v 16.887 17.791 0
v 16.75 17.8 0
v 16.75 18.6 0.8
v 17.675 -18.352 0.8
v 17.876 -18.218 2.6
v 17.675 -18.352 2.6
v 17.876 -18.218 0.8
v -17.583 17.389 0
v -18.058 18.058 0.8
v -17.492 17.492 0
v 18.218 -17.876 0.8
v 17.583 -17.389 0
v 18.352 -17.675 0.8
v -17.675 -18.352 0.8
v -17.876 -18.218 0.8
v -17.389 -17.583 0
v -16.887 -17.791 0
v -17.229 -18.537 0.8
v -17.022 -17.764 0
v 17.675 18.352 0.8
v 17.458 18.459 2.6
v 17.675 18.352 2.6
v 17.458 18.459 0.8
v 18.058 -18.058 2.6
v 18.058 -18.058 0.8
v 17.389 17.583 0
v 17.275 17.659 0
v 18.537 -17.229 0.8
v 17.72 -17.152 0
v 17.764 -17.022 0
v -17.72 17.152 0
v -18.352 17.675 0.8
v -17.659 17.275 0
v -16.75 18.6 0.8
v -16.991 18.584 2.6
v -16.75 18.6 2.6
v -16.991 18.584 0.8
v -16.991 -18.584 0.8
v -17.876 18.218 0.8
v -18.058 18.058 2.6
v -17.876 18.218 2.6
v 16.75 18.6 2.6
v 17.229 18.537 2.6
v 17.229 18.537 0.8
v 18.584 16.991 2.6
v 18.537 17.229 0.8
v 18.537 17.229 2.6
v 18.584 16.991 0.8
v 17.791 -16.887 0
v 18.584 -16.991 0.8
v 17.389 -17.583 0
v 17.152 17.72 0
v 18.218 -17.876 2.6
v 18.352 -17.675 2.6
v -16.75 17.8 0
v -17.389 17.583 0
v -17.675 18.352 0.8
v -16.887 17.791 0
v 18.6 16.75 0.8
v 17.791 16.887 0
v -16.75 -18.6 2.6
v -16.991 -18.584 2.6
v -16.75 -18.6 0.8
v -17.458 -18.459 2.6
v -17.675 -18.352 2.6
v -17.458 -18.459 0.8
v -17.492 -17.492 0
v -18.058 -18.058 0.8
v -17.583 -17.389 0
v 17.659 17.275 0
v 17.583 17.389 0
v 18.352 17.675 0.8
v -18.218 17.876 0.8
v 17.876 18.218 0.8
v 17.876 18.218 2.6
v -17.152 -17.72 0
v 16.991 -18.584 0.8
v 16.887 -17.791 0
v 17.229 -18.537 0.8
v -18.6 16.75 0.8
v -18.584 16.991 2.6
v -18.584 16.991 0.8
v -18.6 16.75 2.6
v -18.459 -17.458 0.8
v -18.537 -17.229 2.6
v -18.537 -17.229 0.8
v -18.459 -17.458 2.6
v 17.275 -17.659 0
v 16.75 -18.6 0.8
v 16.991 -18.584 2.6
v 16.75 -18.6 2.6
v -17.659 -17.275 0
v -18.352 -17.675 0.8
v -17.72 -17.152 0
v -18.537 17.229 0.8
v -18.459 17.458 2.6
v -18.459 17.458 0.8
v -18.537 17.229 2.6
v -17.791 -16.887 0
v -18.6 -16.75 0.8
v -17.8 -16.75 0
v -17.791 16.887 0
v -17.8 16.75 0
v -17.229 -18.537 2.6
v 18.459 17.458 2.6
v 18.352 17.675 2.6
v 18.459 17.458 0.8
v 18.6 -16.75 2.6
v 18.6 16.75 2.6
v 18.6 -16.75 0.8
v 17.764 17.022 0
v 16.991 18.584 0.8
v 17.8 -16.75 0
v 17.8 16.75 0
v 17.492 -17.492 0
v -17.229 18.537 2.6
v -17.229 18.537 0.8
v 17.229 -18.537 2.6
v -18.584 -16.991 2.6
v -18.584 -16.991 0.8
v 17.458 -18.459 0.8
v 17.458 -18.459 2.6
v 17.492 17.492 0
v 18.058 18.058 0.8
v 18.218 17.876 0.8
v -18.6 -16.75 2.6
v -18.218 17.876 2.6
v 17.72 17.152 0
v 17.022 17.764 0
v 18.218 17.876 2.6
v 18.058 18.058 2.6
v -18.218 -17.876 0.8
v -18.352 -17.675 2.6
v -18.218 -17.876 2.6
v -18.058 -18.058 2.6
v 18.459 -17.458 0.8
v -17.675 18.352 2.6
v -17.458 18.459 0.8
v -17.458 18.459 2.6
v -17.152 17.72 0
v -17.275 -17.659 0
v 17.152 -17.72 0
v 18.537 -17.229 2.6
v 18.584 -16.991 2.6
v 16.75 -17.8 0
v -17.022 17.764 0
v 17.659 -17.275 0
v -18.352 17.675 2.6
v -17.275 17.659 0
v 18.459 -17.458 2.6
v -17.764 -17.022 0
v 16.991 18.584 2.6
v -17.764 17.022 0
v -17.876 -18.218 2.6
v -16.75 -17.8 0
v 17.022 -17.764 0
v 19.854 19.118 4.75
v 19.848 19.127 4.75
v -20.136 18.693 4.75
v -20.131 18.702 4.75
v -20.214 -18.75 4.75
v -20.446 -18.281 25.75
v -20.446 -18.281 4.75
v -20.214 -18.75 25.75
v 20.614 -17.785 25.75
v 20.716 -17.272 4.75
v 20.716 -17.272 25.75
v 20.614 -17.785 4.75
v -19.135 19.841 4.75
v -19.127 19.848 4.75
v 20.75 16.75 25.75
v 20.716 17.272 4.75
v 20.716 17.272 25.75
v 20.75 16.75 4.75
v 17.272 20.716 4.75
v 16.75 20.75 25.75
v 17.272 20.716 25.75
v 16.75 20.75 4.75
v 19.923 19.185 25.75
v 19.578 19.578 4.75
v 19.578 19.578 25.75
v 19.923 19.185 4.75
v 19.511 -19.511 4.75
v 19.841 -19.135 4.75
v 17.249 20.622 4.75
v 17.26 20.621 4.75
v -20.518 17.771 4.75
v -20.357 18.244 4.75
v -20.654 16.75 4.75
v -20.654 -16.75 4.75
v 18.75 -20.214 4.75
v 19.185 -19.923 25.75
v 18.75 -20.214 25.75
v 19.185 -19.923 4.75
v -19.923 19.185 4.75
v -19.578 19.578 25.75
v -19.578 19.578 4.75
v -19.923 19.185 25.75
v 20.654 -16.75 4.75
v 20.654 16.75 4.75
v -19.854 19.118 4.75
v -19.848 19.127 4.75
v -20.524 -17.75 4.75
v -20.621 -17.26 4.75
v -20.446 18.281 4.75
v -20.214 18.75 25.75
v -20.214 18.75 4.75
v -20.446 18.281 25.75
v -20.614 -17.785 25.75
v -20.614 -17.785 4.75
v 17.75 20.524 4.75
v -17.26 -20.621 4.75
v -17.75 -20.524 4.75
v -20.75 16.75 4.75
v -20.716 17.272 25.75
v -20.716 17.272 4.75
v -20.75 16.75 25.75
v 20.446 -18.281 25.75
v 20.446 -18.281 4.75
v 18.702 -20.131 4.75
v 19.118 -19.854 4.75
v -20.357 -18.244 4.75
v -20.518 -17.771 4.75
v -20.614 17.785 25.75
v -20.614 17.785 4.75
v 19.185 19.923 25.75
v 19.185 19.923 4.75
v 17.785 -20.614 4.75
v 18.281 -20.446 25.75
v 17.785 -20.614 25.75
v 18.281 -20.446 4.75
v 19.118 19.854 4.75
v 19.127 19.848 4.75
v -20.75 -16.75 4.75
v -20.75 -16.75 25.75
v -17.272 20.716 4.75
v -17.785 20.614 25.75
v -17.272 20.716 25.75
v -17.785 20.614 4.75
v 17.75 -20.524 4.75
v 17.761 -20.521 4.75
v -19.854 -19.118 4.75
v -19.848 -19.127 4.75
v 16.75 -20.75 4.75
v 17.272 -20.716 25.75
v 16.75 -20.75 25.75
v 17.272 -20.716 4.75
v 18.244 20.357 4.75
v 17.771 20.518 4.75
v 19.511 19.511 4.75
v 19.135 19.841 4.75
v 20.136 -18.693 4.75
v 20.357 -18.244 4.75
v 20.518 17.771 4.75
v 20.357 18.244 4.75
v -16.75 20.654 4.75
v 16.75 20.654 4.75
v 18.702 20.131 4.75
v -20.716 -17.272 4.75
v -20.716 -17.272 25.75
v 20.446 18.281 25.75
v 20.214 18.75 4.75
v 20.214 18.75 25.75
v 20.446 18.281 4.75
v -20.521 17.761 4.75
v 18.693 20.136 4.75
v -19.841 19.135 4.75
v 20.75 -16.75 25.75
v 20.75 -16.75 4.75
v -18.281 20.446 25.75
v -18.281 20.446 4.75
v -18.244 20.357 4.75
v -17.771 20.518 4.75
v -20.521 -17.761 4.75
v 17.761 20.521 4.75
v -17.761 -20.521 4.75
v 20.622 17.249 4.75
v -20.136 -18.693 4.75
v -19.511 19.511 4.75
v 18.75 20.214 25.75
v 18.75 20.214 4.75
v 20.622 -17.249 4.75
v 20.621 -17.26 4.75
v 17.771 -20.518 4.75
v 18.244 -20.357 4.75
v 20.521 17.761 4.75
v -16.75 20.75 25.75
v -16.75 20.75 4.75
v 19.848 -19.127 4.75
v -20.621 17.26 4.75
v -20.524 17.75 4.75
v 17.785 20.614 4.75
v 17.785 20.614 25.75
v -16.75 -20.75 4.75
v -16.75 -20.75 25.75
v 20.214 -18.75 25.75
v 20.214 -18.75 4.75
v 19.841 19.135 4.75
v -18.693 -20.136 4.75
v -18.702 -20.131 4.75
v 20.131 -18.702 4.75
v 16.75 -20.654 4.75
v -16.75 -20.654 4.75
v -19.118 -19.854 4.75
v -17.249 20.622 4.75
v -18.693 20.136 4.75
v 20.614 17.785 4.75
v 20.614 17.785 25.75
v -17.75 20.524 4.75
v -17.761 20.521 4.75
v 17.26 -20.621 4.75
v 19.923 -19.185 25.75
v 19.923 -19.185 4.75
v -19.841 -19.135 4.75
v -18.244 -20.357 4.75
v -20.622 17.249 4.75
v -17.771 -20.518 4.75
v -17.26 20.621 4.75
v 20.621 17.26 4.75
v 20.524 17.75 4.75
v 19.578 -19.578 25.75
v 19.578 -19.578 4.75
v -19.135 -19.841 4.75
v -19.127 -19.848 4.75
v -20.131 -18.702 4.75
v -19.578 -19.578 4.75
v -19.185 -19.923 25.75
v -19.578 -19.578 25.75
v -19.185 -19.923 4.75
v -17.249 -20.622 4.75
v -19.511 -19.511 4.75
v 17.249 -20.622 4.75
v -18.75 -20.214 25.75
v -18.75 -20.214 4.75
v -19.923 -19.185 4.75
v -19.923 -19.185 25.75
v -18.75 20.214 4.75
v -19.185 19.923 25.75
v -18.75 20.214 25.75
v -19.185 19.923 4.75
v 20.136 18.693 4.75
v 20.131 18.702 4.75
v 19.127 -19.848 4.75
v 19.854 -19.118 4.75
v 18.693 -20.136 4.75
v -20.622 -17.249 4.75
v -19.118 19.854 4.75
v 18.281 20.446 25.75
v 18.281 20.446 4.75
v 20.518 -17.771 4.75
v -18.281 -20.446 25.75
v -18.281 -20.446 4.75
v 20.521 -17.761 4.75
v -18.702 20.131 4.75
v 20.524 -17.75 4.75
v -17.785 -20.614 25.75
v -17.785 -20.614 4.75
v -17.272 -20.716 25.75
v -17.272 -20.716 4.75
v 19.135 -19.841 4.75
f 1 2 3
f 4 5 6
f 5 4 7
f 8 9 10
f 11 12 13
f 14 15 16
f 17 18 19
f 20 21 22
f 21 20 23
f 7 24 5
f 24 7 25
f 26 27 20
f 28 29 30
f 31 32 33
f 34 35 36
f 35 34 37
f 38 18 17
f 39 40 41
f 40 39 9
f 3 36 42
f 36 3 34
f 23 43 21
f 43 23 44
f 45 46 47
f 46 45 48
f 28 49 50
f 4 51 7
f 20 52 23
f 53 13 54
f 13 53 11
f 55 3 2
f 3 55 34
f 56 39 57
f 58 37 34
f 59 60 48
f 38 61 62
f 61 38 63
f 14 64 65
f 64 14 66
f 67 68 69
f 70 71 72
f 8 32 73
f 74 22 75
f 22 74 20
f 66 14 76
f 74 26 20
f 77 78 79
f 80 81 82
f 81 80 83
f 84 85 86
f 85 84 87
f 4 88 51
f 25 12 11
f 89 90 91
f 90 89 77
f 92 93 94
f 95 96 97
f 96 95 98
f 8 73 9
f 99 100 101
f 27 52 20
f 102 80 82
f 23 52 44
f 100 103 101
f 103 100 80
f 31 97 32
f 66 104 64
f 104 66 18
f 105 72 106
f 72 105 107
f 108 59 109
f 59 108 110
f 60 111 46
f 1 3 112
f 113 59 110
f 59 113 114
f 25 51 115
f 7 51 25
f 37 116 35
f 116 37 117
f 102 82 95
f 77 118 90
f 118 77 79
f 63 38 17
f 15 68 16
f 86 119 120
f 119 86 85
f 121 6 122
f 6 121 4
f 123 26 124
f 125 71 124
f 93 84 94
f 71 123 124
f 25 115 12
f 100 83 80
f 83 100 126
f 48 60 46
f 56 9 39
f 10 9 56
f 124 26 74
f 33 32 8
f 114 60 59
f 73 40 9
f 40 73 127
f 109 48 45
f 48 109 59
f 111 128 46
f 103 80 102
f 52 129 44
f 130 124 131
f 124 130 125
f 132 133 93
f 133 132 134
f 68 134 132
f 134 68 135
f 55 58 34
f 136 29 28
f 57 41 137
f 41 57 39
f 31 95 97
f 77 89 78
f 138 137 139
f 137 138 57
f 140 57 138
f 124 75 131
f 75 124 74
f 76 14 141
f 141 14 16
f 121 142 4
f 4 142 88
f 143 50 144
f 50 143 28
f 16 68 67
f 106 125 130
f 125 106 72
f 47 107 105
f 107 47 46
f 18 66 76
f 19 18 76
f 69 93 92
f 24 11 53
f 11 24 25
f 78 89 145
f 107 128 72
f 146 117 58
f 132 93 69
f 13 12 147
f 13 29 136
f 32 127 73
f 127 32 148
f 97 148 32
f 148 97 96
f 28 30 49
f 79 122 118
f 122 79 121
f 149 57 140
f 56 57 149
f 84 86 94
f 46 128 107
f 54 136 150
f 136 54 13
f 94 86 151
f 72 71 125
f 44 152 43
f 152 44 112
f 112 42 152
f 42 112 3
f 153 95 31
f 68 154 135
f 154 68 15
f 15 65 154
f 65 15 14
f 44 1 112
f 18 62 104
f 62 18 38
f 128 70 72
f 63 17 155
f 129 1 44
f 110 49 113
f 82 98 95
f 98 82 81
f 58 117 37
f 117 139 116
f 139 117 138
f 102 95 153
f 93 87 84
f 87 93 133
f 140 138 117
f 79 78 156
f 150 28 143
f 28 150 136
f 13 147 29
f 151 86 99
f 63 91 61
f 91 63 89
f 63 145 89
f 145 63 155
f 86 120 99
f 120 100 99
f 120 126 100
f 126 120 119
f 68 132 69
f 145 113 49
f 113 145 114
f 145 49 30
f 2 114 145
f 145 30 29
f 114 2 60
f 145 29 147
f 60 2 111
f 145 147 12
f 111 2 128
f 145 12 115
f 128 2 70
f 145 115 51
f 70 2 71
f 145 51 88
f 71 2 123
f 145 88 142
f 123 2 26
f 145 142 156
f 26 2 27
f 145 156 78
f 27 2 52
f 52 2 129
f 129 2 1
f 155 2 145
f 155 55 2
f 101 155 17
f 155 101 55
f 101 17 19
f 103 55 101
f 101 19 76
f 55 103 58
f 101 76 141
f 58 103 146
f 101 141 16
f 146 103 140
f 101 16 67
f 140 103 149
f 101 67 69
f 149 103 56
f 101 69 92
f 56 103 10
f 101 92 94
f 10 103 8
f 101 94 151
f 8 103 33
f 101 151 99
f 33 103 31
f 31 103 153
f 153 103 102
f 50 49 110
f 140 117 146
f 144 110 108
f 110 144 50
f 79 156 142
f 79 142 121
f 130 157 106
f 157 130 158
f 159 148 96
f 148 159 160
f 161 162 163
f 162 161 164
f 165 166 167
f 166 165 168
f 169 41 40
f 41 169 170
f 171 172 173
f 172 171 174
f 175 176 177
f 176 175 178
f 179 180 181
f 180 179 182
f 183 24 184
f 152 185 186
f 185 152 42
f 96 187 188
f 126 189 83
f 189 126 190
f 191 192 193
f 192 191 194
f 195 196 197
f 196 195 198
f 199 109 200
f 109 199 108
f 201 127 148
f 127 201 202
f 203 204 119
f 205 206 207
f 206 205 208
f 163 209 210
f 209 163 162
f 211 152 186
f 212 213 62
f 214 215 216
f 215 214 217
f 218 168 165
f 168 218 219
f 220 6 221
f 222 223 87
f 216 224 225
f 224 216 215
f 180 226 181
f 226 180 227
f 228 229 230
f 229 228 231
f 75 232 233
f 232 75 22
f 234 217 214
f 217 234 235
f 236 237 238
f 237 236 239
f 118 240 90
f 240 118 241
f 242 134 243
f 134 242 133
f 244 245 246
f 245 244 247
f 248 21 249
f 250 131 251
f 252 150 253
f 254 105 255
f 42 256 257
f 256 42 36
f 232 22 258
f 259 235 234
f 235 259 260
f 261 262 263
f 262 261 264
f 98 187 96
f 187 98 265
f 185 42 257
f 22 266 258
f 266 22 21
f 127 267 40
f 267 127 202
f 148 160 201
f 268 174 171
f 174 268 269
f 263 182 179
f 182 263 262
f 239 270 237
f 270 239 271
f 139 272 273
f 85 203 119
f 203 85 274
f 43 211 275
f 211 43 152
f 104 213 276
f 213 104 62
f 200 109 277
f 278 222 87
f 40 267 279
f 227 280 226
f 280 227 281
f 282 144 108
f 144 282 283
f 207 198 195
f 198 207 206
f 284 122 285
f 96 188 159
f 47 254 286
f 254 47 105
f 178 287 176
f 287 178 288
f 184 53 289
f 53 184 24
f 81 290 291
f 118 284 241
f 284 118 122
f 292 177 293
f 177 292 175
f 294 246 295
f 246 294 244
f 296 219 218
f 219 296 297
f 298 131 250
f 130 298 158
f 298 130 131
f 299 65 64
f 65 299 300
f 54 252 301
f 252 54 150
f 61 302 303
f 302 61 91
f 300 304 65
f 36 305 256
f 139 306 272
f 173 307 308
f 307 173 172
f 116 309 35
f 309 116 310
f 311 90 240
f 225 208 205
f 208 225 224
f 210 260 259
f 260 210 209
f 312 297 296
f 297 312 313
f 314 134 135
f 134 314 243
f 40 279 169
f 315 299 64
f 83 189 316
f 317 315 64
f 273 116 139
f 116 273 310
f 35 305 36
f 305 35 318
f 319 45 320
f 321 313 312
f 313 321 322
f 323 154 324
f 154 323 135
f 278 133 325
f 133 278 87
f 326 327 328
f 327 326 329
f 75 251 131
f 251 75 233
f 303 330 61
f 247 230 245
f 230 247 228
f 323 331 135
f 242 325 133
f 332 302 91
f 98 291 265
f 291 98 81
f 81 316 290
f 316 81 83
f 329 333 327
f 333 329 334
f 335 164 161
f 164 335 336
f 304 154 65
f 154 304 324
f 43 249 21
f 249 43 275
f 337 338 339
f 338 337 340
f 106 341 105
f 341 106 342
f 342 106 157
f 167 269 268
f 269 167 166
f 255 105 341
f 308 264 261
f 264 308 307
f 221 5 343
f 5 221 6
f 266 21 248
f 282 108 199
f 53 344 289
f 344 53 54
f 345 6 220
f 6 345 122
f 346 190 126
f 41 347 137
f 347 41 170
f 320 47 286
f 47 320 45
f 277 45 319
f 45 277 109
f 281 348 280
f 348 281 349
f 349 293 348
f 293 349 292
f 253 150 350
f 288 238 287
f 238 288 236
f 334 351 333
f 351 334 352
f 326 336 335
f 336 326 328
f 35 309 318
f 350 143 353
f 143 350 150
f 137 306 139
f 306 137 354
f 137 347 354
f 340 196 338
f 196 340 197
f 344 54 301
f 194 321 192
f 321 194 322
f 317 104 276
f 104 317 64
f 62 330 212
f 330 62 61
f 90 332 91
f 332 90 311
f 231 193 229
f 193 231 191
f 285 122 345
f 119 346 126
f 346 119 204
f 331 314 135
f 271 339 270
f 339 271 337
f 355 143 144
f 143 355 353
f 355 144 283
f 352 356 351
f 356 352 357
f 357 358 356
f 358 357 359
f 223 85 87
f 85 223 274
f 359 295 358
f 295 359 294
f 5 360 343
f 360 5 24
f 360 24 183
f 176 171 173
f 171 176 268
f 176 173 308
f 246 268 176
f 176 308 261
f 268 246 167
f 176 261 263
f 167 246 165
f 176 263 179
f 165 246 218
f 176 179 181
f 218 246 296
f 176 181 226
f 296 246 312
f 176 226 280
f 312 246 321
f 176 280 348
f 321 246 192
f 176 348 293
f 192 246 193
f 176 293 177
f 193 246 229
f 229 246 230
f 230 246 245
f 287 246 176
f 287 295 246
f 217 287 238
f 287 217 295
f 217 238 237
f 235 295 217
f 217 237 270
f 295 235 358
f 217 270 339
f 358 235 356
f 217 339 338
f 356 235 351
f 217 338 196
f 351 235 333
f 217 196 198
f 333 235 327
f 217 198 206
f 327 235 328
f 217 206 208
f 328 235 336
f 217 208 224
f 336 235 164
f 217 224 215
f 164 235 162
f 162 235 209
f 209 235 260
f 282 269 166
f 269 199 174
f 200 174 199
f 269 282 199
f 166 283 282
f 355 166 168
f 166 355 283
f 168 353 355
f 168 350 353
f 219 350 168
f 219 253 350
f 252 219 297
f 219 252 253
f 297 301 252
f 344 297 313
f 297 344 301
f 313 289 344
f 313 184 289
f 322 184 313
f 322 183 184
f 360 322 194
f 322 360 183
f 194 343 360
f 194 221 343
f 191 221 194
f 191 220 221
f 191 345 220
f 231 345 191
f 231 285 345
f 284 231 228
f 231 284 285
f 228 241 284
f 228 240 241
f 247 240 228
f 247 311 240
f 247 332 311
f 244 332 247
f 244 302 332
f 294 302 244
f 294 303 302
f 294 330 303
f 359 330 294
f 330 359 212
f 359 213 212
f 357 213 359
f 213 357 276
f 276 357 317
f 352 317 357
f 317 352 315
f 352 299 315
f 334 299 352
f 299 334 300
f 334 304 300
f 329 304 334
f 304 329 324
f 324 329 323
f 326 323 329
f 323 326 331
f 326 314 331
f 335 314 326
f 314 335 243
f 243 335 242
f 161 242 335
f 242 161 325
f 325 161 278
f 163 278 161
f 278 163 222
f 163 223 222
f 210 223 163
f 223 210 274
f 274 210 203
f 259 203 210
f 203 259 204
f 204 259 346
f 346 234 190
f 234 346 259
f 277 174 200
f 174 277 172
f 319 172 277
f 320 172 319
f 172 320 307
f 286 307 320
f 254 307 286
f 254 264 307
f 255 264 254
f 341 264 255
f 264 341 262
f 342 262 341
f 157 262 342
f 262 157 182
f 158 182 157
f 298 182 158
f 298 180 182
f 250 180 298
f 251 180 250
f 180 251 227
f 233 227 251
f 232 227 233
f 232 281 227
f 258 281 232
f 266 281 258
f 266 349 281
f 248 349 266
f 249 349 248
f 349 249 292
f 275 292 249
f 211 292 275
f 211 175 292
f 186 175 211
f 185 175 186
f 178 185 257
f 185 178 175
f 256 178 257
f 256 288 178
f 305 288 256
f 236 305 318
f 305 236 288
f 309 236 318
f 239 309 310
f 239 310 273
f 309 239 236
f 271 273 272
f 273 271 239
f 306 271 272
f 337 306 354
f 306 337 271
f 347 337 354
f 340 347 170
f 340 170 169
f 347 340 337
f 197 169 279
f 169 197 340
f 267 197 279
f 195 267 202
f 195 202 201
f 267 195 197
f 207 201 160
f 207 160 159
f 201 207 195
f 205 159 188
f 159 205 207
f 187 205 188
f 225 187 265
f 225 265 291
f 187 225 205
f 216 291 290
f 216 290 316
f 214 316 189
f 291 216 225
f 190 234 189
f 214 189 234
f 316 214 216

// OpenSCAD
// ════════════════════════════════════════════════════════════
//  Gridfinity Creator — LITE bins & baseplates
//  Vase-mode (spiral) printable bins + thin-wall open-bottom
//  baseplates. Footprints in multiples of 0.5 / 1 / 2 / 4 units.
//
//  Customizer-ready for MakerWorld / Printables / Thangs.
//  Companion of the OneWall web preview (index.html → Gridfinity).
//
//  Bin: print with Spiral vase ON, bottom shell layers ≥ 26
//  (≈ 5.2 mm at 0.2 mm layers — keeps the per-cell feet solid).
//  Baseplate: normal mode, 2 perimeters, no infill needed.
//
//  License: CC BY 4.0 — @Amitkuzi
// ════════════════════════════════════════════════════════════

/* [What to generate] */
// bin = vase-mode bin, baseplate = socket grid
part = "bin"; // [bin, baseplate]

/* [Bin size — Gridfinity units] */
// width in grid units
units_x = 1; // [0.5:0.5:8]
// depth in grid units
units_y = 1; // [0.5:0.5:8]
// height in 7 mm units (above the 4.75 mm base)
height_units = 3; // [1:0.5:12]
// leg size: 0.5 = 21 mm, 1 = 42 mm, 2 = 84 mm. Must divide the bin
// size on both axes; otherwise 0.5 legs are used (always valid).
leg_mult = 1; // [0.5, 1, 2]

/* [Baseplate] */
// cells along X
cells_x = 3; // [1:1:8]
// cells along Y
cells_y = 3; // [1:1:8]
// cell size multiplier (0.5 = 21 mm half-pitch grid)
cell_mult = 1; // [0.5, 1, 2, 4]
// total plate height (socket profile is the top 4.75 mm)
plate_h = 5; // [4.75:0.25:8]

/* [Fit & style] */
// corner radius of bins / sockets
corner_r = 4; // [1:0.5:8]
// socket-to-bin clearance per side
clearance = 0.25; // [0.1:0.05:0.5]

/* [Hidden] */
PITCH     = 42;    // Gridfinity XY unit
HU        = 7;     // Gridfinity Z unit
FOOT_GAP  = 0.5;   // bin outer = units*42 - 0.5
BASE_C1   = 0.8;   // bottom 45° chamfer
BASE_S    = 1.8;   // straight section
BASE_C2   = 2.15;  // top 45° chamfer
BASE_H    = BASE_C1 + BASE_S + BASE_C2;   // 4.75
BASE_INSET = BASE_C1 + BASE_C2;           // 2.95
$fn = 48;

function footprint(u) = u * PITCH - FOOT_GAP;

// Does leg size m tile bin size u exactly?
function leg_fits(u, m) = abs(u / m - round(u / m)) < 1e-6;
// Requested leg size when it tiles both axes, else 0.5 (always valid)
function eff_leg(ux, uy, m) =
  (leg_fits(ux, m) && leg_fits(uy, m)) ? m : 0.5;

// ── 2D rounded rectangle, centred ───────────────────────────
module rrect(w, d, r) {
  rr = max(0.05, min(r, w/2 - 0.05, d/2 - 0.05));
  offset(r = rr) square([w - 2*rr, d - 2*rr], center = true);
}

// One infinitely-thin slice of the profile at height z, inset `in`
module slice(w, d, r, z, in) {
  translate([0, 0, z])
    linear_extrude(0.001)
      rrect(w - 2*in, d - 2*in, max(r - in, 0.3));
}

// ── Bin — spiral body on per-cell feet ──────────────────────
// The base is one standard Gridfinity foot PER 42 mm CELL (a 2x2
// bin gets 4 feet), so any size seats on a normal baseplate.
// Sub-unit (0.5) bins get a single small foot for 21 mm plates.
// Above the feet: one continuous wall for spiral/vase printing.
//
// PRINT: Spiral vase ON + bottom shell layers ≥ 26 (≈ 5.2 mm at
// 0.2 mm layers) so the feet and deck are solid before the spiral
// wall starts.
module gridfinity_foot(fw, fd) {
  hull() { slice(fw, fd, corner_r, 0,                BASE_INSET);
           slice(fw, fd, corner_r, BASE_C1,          BASE_C2); }
  hull() { slice(fw, fd, corner_r, BASE_C1,          BASE_C2);
           slice(fw, fd, corner_r, BASE_C1 + BASE_S, BASE_C2); }
  hull() { slice(fw, fd, corner_r, BASE_C1 + BASE_S, BASE_C2);
           slice(fw, fd, corner_r, BASE_H + 0.1,     0); }
}

module gridfinity_bin(ux = units_x, uy = units_y, hu = height_units,
                      lm = leg_mult) {
  w  = footprint(ux);
  d  = footprint(uy);
  m  = eff_leg(ux, uy, lm);   // leg size in grid units (0.5 / 1 / 2)
  lp = m * PITCH;             // leg pitch: 21 / 42 / 84 mm
  nx = round(ux / m);
  ny = round(uy / m);
  fw = footprint(m);
  fd = footprint(m);
  union() {
    // feet tiling the footprint on the leg-pitch grid
    translate([-(nx - 1) * lp / 2, -(ny - 1) * lp / 2, 0])
      for (ix = [0 : nx - 1], iy = [0 : ny - 1])
        translate([ix * lp, iy * lp, 0])
          gridfinity_foot(fw, fd);
    // continuous spiral body
    translate([0, 0, BASE_H])
      linear_extrude(hu * HU)
        rrect(w, d, corner_r);
  }
}

// ── Baseplate — lite, open bottom (no floor) ────────────────
// Each cell is a frame whose inner wall is the socket: the
// negative of the bin base plus clearance. Bins drop in from the
// top; the open bottom saves material and print time.
module socket_negative(m = cell_mult) {
  ow = footprint(m) + 2 * clearance;   // top opening
  r  = corner_r + clearance;
  eps = 0.1;
  top = plate_h;
  union() {
    hull() { slice(ow, ow, r, top - BASE_C2,          BASE_C2);
             slice(ow, ow, r, top + eps,              -eps); }
    hull() { slice(ow, ow, r, top - BASE_C2 - BASE_S, BASE_C2);
             slice(ow, ow, r, top - BASE_C2,          BASE_C2); }
    hull() { slice(ow, ow, r, top - BASE_H,           BASE_INSET);
             slice(ow, ow, r, top - BASE_C2 - BASE_S, BASE_C2); }
    // straight shaft through the floor → open bottom
    translate([0, 0, -eps])
      linear_extrude(top - BASE_H + 2*eps)
        rrect(ow - 2*BASE_INSET, ow - 2*BASE_INSET, max(r - BASE_INSET, 0.3));
  }
}

module gridfinity_baseplate(cx = cells_x, cy = cells_y, m = cell_mult) {
  cell = m * PITCH;
  translate([-(cx - 1) * cell / 2, -(cy - 1) * cell / 2, 0])
    for (ix = [0 : cx - 1], iy = [0 : cy - 1])
      translate([ix * cell, iy * cell, 0])
        difference() {
          linear_extrude(plate_h) rrect(cell, cell, 2);
          socket_negative(m);
        }
}

// ── Entry point ─────────────────────────────────────────────
if (part == "bin")       gridfinity_bin();
if (part == "baseplate") gridfinity_baseplate();
